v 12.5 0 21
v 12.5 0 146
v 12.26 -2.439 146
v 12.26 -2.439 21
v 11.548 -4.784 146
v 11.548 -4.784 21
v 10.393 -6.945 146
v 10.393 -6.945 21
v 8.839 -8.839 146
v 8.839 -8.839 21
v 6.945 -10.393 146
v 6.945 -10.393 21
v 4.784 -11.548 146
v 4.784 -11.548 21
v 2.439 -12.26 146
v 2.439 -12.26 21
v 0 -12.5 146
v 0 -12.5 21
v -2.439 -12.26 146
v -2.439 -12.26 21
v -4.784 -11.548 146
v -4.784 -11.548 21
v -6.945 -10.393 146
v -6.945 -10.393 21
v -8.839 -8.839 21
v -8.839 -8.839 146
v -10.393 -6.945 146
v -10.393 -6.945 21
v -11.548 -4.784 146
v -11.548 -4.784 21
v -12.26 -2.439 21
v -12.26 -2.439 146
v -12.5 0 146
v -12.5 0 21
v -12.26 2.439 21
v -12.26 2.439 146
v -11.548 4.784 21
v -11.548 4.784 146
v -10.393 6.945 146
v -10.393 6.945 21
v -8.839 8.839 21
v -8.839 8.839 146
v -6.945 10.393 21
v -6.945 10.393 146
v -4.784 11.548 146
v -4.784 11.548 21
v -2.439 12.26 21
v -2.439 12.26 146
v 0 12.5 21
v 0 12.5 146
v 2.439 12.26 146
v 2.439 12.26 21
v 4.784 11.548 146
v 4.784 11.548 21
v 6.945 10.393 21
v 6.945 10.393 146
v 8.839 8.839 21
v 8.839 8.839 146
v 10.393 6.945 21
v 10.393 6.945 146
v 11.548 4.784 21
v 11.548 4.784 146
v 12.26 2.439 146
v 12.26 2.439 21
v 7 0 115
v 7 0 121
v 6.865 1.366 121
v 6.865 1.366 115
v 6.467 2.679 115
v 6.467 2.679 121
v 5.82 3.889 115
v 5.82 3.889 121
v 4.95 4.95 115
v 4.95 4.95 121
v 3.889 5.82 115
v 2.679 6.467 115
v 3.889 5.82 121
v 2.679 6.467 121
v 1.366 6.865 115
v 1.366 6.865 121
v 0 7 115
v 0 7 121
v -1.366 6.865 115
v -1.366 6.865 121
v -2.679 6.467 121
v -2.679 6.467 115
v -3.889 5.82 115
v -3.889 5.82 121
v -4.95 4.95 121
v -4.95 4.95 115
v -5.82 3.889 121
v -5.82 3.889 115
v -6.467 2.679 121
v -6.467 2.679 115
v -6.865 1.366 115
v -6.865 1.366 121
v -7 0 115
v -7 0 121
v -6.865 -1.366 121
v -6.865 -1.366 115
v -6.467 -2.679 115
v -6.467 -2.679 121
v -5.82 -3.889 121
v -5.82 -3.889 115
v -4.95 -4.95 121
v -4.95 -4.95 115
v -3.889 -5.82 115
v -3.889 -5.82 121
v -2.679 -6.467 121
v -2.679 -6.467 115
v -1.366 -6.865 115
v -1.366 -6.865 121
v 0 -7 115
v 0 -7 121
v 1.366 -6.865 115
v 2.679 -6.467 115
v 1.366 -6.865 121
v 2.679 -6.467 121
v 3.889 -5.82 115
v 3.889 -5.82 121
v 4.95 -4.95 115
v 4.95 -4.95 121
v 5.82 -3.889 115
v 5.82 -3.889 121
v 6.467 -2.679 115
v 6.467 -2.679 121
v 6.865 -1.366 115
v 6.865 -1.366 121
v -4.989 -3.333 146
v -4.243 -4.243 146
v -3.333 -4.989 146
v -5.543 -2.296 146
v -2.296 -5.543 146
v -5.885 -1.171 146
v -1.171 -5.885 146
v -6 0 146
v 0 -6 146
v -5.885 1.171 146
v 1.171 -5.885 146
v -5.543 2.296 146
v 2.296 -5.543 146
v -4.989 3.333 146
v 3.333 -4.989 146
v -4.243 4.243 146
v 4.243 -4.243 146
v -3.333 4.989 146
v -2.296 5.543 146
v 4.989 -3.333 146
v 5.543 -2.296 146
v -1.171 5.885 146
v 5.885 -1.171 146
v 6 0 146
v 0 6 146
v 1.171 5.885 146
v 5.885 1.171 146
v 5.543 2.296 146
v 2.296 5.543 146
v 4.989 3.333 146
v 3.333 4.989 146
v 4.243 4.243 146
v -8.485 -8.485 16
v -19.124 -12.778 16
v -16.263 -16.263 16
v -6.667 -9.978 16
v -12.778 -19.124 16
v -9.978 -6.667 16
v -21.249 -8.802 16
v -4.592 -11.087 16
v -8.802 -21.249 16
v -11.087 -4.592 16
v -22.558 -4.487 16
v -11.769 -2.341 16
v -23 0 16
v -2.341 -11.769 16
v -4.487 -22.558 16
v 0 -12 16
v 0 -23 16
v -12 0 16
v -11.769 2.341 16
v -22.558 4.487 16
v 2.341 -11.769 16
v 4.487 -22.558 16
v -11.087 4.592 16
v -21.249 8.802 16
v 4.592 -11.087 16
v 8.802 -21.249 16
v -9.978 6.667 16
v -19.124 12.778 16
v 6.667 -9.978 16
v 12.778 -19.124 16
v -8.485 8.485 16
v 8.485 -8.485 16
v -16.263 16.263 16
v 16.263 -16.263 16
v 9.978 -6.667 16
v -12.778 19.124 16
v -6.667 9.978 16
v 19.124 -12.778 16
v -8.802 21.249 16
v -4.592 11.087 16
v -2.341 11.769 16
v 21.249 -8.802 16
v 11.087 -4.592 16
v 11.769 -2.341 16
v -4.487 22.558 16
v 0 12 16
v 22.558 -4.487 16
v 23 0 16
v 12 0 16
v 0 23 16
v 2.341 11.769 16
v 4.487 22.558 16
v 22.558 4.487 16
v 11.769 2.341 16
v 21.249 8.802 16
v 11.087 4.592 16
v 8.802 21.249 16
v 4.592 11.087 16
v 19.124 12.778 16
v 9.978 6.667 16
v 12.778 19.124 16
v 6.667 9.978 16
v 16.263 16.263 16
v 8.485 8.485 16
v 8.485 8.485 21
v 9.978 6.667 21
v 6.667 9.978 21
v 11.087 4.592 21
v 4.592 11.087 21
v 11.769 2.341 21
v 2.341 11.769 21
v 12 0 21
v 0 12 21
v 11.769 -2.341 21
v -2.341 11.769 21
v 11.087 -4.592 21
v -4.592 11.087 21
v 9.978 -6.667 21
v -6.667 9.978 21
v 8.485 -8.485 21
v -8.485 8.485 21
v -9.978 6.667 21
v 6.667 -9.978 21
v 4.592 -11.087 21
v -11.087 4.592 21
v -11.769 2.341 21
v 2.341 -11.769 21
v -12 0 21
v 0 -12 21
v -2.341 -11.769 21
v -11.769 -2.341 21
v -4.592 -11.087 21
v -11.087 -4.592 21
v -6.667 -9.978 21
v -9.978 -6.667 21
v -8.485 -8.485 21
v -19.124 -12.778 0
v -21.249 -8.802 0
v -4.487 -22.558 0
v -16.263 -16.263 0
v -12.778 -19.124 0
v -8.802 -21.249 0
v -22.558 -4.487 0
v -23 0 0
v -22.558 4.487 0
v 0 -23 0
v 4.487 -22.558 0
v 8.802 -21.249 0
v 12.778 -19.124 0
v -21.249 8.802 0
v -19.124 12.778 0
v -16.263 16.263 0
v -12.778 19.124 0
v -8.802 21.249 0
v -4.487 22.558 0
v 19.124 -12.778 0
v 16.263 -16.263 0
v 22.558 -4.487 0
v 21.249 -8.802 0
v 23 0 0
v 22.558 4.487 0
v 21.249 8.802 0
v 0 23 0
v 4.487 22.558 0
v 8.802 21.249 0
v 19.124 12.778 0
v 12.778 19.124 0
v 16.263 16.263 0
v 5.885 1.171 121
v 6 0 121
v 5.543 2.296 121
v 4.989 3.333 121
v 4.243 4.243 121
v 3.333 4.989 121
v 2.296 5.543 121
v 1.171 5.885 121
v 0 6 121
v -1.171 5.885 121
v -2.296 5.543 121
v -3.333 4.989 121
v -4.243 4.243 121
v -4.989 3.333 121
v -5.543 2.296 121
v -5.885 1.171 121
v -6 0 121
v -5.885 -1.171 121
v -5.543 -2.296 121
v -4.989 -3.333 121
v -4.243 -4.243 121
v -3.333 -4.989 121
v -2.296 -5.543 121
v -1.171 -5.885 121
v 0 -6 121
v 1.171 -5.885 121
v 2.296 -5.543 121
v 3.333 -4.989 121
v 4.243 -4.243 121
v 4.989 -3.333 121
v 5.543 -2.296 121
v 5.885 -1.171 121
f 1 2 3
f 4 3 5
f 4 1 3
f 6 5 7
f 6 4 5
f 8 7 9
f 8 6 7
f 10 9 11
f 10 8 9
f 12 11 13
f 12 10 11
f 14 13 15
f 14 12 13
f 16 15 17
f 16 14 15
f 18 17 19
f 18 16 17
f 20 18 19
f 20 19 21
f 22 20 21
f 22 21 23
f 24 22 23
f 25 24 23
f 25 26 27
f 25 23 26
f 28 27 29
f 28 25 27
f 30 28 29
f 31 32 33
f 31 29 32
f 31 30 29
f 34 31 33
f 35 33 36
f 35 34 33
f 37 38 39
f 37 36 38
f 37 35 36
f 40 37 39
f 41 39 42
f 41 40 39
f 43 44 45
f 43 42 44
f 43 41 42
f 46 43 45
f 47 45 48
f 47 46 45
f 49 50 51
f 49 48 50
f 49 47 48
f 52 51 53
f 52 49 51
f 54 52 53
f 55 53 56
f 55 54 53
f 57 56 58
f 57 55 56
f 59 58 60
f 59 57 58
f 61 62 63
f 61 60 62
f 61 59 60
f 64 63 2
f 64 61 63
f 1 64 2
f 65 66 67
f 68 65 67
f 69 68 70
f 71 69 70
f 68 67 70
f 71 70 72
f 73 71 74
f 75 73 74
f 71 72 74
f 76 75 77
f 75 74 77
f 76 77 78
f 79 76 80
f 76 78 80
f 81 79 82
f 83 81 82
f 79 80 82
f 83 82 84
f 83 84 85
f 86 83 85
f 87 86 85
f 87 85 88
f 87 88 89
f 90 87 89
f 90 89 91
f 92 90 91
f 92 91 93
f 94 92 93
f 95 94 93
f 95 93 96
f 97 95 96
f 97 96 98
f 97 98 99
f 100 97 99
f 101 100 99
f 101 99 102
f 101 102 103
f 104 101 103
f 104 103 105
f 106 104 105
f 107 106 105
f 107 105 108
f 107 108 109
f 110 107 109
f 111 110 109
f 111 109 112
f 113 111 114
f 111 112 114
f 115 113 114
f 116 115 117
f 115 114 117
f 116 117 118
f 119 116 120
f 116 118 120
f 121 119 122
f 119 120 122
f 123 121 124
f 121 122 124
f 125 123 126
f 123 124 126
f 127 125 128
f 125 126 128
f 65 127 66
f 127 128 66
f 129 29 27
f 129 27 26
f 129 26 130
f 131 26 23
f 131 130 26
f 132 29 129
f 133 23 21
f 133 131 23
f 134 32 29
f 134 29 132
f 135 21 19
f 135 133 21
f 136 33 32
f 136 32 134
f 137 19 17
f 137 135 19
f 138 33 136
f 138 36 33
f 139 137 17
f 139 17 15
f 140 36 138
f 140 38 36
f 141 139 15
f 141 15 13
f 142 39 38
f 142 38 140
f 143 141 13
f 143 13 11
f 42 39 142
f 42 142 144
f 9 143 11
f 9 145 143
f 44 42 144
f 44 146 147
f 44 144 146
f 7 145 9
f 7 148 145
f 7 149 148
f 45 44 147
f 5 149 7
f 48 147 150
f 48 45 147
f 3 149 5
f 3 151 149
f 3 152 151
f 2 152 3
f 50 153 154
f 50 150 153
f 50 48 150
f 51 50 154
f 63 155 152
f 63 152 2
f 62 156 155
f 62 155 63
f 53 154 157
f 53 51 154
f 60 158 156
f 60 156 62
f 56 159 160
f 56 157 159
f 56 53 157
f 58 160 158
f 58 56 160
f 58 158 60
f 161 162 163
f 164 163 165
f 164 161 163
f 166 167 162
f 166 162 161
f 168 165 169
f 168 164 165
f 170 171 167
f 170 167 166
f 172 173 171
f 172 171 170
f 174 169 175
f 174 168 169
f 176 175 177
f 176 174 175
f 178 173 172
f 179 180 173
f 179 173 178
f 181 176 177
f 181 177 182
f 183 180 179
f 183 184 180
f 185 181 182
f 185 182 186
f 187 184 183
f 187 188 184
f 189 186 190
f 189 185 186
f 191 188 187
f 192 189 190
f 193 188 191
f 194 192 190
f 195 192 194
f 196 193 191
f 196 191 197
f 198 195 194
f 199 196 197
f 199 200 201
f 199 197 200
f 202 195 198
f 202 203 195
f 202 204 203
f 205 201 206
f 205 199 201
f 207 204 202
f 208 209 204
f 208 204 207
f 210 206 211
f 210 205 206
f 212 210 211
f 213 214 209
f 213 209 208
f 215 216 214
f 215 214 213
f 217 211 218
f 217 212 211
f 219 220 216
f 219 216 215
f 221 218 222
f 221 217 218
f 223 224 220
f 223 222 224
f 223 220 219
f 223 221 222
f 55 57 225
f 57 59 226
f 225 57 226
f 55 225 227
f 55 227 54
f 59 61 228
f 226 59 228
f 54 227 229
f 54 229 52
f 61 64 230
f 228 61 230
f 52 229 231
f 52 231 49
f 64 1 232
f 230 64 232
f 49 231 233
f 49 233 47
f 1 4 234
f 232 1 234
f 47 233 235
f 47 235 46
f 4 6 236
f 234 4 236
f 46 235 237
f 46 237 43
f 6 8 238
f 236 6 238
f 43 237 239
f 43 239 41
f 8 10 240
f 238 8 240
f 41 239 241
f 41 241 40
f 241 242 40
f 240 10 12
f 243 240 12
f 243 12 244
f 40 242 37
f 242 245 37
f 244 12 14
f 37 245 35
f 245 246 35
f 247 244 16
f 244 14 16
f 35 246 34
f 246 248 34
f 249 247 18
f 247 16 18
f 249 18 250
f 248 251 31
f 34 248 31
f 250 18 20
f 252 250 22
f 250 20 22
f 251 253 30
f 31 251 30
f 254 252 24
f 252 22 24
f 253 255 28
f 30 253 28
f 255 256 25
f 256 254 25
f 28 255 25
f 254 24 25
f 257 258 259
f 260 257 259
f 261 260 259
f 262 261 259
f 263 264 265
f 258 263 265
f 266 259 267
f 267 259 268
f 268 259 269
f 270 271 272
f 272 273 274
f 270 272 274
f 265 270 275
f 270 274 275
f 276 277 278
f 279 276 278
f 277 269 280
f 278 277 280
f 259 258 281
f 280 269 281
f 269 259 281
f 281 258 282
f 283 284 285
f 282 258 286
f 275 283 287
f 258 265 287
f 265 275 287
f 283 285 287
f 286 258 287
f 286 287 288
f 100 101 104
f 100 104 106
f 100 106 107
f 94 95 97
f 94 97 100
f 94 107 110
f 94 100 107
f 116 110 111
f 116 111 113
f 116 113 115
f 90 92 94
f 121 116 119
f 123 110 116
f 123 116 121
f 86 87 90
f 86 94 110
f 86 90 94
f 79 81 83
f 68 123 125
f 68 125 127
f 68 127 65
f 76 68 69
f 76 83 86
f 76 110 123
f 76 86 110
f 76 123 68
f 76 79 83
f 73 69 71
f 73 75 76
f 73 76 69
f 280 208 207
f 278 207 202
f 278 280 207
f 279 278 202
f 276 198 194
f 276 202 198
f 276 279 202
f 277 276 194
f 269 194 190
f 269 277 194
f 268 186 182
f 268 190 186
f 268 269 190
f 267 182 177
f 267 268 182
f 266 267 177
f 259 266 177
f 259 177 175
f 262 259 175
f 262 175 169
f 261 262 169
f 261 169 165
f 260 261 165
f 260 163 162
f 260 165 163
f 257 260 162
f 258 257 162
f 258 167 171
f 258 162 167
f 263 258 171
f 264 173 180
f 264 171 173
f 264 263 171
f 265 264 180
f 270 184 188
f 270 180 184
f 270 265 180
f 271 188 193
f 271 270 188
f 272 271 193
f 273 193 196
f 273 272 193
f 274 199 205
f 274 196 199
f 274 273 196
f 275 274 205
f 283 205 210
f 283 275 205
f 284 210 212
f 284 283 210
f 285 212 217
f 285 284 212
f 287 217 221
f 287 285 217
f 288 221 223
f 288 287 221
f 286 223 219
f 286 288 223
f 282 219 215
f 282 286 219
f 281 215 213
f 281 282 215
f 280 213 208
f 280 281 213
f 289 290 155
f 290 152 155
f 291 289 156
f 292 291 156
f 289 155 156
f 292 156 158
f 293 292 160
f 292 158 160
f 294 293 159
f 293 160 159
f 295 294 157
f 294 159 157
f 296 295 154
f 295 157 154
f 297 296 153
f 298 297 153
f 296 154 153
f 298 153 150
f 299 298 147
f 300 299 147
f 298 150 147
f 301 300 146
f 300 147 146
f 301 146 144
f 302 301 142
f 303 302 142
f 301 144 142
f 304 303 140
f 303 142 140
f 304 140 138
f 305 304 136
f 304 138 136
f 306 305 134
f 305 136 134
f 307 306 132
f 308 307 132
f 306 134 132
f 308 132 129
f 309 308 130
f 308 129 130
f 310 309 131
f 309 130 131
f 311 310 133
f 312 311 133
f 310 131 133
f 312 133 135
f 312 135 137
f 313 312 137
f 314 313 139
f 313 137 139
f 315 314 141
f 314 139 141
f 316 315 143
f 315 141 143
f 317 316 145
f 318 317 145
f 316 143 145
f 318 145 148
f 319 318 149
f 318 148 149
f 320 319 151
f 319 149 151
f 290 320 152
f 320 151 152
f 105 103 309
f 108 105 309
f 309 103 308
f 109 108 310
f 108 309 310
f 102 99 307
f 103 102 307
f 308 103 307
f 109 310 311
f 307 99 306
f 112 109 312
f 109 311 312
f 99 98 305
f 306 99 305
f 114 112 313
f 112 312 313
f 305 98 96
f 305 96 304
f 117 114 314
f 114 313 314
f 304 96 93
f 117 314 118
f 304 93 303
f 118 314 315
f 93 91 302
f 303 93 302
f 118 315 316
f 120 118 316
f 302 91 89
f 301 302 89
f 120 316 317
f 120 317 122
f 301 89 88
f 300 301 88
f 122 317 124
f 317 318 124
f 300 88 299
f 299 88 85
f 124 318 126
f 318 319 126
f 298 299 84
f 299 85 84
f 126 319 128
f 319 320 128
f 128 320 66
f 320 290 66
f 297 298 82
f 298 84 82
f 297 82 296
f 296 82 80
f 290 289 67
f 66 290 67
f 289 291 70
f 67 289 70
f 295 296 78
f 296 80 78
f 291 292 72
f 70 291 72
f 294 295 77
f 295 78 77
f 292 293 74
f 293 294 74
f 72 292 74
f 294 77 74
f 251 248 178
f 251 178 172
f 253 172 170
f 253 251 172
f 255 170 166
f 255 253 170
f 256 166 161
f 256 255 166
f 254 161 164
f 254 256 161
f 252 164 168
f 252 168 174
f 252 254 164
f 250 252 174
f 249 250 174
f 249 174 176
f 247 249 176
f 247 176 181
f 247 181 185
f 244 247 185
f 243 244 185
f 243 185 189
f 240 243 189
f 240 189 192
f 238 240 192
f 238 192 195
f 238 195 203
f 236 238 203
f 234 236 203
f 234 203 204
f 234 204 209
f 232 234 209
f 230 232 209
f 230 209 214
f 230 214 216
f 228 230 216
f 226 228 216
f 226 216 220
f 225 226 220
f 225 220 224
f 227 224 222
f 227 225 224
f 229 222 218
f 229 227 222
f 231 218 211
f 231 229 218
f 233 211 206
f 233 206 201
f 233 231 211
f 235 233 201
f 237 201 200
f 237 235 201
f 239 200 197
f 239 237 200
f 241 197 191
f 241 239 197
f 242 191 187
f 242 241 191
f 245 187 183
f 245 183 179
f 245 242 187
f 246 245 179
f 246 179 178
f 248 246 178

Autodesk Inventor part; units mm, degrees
ref_plane "YZ Plane" through (0, 0, 0) normal (1, 0, 0) x (0, 1, 0)
ref_plane "XZ Plane" through (0, 0, 0) normal (0, 1, 0) x (-1, 0, 0)
ref_plane "XY Plane" through (0, 0, 0) normal (0, 0, 1) x (1, 0, 0)
sketch "Sketch1" plane through (0, 0, 0) normal (0, 0, 1) x (1, 0, 0)
  circle A0 centre (0, 0) radius 23
  dimension "d0" = 46
extrude "Extrusion1" add sketch "Sketch1" along normal blind 16
sketch "Sketch2" plane through (0, 0, 16) normal (0, 0, 1) x (1, 0, 0)
  circle A0 centre (0, 0) radius 12.5
  dimension "d3" = 25
extrude "Extrusion2" add sketch "Sketch2" along normal blind 130
sketch "Sketch3" plane through (0, 0, 146) normal (0, 0, 1) x (1, 0, 0)
  circle A0 centre (0, 0) radius 6
  dimension "d6" = 12
extrude "Extrusion3" cut sketch "Sketch3" against normal blind 25
sketch "Sketch4" plane through (0, 0, 121) normal (0, 0, 1) x (1, 0, 0)
  circle A0 centre (0, 0) radius 12.5 projected
  circle A1 centre (0, 0) radius 7
  dimension "d9" = 14
extrude "Extrusion4" cut sketch "Sketch4" against normal blind 6 contours A1
sketch "Sketch5" plane through (0, 0, 0) normal (0, 1, 0) x (-1, 0, 0)
  line L0 (12.5, 16) -> (12.5, 146) projected
  line L1 (12.5, 16) -> (12, 16)
  line L2 (12, 16) -> (12, 21)
  line L3 (12, 21) -> (12.5, 21)
  line L4 (12.5, 21) -> (12.5, 16)
  line L5 (23, 16) -> (-23, 16) projected
  line L6 (0, -4.7692) -> (0, 158.9515) construction
  point P0 (0, 0)
  dimension "d12" = 0.5
  dimension "d13" = 5
  dimension "d14" = 0
revolve "Revolution1" cut sketch "Sketch5" angle 360 about axis through (0, 0, -4.7692) along (0, 0, 1)
properties part number "Pino do Amassador"
